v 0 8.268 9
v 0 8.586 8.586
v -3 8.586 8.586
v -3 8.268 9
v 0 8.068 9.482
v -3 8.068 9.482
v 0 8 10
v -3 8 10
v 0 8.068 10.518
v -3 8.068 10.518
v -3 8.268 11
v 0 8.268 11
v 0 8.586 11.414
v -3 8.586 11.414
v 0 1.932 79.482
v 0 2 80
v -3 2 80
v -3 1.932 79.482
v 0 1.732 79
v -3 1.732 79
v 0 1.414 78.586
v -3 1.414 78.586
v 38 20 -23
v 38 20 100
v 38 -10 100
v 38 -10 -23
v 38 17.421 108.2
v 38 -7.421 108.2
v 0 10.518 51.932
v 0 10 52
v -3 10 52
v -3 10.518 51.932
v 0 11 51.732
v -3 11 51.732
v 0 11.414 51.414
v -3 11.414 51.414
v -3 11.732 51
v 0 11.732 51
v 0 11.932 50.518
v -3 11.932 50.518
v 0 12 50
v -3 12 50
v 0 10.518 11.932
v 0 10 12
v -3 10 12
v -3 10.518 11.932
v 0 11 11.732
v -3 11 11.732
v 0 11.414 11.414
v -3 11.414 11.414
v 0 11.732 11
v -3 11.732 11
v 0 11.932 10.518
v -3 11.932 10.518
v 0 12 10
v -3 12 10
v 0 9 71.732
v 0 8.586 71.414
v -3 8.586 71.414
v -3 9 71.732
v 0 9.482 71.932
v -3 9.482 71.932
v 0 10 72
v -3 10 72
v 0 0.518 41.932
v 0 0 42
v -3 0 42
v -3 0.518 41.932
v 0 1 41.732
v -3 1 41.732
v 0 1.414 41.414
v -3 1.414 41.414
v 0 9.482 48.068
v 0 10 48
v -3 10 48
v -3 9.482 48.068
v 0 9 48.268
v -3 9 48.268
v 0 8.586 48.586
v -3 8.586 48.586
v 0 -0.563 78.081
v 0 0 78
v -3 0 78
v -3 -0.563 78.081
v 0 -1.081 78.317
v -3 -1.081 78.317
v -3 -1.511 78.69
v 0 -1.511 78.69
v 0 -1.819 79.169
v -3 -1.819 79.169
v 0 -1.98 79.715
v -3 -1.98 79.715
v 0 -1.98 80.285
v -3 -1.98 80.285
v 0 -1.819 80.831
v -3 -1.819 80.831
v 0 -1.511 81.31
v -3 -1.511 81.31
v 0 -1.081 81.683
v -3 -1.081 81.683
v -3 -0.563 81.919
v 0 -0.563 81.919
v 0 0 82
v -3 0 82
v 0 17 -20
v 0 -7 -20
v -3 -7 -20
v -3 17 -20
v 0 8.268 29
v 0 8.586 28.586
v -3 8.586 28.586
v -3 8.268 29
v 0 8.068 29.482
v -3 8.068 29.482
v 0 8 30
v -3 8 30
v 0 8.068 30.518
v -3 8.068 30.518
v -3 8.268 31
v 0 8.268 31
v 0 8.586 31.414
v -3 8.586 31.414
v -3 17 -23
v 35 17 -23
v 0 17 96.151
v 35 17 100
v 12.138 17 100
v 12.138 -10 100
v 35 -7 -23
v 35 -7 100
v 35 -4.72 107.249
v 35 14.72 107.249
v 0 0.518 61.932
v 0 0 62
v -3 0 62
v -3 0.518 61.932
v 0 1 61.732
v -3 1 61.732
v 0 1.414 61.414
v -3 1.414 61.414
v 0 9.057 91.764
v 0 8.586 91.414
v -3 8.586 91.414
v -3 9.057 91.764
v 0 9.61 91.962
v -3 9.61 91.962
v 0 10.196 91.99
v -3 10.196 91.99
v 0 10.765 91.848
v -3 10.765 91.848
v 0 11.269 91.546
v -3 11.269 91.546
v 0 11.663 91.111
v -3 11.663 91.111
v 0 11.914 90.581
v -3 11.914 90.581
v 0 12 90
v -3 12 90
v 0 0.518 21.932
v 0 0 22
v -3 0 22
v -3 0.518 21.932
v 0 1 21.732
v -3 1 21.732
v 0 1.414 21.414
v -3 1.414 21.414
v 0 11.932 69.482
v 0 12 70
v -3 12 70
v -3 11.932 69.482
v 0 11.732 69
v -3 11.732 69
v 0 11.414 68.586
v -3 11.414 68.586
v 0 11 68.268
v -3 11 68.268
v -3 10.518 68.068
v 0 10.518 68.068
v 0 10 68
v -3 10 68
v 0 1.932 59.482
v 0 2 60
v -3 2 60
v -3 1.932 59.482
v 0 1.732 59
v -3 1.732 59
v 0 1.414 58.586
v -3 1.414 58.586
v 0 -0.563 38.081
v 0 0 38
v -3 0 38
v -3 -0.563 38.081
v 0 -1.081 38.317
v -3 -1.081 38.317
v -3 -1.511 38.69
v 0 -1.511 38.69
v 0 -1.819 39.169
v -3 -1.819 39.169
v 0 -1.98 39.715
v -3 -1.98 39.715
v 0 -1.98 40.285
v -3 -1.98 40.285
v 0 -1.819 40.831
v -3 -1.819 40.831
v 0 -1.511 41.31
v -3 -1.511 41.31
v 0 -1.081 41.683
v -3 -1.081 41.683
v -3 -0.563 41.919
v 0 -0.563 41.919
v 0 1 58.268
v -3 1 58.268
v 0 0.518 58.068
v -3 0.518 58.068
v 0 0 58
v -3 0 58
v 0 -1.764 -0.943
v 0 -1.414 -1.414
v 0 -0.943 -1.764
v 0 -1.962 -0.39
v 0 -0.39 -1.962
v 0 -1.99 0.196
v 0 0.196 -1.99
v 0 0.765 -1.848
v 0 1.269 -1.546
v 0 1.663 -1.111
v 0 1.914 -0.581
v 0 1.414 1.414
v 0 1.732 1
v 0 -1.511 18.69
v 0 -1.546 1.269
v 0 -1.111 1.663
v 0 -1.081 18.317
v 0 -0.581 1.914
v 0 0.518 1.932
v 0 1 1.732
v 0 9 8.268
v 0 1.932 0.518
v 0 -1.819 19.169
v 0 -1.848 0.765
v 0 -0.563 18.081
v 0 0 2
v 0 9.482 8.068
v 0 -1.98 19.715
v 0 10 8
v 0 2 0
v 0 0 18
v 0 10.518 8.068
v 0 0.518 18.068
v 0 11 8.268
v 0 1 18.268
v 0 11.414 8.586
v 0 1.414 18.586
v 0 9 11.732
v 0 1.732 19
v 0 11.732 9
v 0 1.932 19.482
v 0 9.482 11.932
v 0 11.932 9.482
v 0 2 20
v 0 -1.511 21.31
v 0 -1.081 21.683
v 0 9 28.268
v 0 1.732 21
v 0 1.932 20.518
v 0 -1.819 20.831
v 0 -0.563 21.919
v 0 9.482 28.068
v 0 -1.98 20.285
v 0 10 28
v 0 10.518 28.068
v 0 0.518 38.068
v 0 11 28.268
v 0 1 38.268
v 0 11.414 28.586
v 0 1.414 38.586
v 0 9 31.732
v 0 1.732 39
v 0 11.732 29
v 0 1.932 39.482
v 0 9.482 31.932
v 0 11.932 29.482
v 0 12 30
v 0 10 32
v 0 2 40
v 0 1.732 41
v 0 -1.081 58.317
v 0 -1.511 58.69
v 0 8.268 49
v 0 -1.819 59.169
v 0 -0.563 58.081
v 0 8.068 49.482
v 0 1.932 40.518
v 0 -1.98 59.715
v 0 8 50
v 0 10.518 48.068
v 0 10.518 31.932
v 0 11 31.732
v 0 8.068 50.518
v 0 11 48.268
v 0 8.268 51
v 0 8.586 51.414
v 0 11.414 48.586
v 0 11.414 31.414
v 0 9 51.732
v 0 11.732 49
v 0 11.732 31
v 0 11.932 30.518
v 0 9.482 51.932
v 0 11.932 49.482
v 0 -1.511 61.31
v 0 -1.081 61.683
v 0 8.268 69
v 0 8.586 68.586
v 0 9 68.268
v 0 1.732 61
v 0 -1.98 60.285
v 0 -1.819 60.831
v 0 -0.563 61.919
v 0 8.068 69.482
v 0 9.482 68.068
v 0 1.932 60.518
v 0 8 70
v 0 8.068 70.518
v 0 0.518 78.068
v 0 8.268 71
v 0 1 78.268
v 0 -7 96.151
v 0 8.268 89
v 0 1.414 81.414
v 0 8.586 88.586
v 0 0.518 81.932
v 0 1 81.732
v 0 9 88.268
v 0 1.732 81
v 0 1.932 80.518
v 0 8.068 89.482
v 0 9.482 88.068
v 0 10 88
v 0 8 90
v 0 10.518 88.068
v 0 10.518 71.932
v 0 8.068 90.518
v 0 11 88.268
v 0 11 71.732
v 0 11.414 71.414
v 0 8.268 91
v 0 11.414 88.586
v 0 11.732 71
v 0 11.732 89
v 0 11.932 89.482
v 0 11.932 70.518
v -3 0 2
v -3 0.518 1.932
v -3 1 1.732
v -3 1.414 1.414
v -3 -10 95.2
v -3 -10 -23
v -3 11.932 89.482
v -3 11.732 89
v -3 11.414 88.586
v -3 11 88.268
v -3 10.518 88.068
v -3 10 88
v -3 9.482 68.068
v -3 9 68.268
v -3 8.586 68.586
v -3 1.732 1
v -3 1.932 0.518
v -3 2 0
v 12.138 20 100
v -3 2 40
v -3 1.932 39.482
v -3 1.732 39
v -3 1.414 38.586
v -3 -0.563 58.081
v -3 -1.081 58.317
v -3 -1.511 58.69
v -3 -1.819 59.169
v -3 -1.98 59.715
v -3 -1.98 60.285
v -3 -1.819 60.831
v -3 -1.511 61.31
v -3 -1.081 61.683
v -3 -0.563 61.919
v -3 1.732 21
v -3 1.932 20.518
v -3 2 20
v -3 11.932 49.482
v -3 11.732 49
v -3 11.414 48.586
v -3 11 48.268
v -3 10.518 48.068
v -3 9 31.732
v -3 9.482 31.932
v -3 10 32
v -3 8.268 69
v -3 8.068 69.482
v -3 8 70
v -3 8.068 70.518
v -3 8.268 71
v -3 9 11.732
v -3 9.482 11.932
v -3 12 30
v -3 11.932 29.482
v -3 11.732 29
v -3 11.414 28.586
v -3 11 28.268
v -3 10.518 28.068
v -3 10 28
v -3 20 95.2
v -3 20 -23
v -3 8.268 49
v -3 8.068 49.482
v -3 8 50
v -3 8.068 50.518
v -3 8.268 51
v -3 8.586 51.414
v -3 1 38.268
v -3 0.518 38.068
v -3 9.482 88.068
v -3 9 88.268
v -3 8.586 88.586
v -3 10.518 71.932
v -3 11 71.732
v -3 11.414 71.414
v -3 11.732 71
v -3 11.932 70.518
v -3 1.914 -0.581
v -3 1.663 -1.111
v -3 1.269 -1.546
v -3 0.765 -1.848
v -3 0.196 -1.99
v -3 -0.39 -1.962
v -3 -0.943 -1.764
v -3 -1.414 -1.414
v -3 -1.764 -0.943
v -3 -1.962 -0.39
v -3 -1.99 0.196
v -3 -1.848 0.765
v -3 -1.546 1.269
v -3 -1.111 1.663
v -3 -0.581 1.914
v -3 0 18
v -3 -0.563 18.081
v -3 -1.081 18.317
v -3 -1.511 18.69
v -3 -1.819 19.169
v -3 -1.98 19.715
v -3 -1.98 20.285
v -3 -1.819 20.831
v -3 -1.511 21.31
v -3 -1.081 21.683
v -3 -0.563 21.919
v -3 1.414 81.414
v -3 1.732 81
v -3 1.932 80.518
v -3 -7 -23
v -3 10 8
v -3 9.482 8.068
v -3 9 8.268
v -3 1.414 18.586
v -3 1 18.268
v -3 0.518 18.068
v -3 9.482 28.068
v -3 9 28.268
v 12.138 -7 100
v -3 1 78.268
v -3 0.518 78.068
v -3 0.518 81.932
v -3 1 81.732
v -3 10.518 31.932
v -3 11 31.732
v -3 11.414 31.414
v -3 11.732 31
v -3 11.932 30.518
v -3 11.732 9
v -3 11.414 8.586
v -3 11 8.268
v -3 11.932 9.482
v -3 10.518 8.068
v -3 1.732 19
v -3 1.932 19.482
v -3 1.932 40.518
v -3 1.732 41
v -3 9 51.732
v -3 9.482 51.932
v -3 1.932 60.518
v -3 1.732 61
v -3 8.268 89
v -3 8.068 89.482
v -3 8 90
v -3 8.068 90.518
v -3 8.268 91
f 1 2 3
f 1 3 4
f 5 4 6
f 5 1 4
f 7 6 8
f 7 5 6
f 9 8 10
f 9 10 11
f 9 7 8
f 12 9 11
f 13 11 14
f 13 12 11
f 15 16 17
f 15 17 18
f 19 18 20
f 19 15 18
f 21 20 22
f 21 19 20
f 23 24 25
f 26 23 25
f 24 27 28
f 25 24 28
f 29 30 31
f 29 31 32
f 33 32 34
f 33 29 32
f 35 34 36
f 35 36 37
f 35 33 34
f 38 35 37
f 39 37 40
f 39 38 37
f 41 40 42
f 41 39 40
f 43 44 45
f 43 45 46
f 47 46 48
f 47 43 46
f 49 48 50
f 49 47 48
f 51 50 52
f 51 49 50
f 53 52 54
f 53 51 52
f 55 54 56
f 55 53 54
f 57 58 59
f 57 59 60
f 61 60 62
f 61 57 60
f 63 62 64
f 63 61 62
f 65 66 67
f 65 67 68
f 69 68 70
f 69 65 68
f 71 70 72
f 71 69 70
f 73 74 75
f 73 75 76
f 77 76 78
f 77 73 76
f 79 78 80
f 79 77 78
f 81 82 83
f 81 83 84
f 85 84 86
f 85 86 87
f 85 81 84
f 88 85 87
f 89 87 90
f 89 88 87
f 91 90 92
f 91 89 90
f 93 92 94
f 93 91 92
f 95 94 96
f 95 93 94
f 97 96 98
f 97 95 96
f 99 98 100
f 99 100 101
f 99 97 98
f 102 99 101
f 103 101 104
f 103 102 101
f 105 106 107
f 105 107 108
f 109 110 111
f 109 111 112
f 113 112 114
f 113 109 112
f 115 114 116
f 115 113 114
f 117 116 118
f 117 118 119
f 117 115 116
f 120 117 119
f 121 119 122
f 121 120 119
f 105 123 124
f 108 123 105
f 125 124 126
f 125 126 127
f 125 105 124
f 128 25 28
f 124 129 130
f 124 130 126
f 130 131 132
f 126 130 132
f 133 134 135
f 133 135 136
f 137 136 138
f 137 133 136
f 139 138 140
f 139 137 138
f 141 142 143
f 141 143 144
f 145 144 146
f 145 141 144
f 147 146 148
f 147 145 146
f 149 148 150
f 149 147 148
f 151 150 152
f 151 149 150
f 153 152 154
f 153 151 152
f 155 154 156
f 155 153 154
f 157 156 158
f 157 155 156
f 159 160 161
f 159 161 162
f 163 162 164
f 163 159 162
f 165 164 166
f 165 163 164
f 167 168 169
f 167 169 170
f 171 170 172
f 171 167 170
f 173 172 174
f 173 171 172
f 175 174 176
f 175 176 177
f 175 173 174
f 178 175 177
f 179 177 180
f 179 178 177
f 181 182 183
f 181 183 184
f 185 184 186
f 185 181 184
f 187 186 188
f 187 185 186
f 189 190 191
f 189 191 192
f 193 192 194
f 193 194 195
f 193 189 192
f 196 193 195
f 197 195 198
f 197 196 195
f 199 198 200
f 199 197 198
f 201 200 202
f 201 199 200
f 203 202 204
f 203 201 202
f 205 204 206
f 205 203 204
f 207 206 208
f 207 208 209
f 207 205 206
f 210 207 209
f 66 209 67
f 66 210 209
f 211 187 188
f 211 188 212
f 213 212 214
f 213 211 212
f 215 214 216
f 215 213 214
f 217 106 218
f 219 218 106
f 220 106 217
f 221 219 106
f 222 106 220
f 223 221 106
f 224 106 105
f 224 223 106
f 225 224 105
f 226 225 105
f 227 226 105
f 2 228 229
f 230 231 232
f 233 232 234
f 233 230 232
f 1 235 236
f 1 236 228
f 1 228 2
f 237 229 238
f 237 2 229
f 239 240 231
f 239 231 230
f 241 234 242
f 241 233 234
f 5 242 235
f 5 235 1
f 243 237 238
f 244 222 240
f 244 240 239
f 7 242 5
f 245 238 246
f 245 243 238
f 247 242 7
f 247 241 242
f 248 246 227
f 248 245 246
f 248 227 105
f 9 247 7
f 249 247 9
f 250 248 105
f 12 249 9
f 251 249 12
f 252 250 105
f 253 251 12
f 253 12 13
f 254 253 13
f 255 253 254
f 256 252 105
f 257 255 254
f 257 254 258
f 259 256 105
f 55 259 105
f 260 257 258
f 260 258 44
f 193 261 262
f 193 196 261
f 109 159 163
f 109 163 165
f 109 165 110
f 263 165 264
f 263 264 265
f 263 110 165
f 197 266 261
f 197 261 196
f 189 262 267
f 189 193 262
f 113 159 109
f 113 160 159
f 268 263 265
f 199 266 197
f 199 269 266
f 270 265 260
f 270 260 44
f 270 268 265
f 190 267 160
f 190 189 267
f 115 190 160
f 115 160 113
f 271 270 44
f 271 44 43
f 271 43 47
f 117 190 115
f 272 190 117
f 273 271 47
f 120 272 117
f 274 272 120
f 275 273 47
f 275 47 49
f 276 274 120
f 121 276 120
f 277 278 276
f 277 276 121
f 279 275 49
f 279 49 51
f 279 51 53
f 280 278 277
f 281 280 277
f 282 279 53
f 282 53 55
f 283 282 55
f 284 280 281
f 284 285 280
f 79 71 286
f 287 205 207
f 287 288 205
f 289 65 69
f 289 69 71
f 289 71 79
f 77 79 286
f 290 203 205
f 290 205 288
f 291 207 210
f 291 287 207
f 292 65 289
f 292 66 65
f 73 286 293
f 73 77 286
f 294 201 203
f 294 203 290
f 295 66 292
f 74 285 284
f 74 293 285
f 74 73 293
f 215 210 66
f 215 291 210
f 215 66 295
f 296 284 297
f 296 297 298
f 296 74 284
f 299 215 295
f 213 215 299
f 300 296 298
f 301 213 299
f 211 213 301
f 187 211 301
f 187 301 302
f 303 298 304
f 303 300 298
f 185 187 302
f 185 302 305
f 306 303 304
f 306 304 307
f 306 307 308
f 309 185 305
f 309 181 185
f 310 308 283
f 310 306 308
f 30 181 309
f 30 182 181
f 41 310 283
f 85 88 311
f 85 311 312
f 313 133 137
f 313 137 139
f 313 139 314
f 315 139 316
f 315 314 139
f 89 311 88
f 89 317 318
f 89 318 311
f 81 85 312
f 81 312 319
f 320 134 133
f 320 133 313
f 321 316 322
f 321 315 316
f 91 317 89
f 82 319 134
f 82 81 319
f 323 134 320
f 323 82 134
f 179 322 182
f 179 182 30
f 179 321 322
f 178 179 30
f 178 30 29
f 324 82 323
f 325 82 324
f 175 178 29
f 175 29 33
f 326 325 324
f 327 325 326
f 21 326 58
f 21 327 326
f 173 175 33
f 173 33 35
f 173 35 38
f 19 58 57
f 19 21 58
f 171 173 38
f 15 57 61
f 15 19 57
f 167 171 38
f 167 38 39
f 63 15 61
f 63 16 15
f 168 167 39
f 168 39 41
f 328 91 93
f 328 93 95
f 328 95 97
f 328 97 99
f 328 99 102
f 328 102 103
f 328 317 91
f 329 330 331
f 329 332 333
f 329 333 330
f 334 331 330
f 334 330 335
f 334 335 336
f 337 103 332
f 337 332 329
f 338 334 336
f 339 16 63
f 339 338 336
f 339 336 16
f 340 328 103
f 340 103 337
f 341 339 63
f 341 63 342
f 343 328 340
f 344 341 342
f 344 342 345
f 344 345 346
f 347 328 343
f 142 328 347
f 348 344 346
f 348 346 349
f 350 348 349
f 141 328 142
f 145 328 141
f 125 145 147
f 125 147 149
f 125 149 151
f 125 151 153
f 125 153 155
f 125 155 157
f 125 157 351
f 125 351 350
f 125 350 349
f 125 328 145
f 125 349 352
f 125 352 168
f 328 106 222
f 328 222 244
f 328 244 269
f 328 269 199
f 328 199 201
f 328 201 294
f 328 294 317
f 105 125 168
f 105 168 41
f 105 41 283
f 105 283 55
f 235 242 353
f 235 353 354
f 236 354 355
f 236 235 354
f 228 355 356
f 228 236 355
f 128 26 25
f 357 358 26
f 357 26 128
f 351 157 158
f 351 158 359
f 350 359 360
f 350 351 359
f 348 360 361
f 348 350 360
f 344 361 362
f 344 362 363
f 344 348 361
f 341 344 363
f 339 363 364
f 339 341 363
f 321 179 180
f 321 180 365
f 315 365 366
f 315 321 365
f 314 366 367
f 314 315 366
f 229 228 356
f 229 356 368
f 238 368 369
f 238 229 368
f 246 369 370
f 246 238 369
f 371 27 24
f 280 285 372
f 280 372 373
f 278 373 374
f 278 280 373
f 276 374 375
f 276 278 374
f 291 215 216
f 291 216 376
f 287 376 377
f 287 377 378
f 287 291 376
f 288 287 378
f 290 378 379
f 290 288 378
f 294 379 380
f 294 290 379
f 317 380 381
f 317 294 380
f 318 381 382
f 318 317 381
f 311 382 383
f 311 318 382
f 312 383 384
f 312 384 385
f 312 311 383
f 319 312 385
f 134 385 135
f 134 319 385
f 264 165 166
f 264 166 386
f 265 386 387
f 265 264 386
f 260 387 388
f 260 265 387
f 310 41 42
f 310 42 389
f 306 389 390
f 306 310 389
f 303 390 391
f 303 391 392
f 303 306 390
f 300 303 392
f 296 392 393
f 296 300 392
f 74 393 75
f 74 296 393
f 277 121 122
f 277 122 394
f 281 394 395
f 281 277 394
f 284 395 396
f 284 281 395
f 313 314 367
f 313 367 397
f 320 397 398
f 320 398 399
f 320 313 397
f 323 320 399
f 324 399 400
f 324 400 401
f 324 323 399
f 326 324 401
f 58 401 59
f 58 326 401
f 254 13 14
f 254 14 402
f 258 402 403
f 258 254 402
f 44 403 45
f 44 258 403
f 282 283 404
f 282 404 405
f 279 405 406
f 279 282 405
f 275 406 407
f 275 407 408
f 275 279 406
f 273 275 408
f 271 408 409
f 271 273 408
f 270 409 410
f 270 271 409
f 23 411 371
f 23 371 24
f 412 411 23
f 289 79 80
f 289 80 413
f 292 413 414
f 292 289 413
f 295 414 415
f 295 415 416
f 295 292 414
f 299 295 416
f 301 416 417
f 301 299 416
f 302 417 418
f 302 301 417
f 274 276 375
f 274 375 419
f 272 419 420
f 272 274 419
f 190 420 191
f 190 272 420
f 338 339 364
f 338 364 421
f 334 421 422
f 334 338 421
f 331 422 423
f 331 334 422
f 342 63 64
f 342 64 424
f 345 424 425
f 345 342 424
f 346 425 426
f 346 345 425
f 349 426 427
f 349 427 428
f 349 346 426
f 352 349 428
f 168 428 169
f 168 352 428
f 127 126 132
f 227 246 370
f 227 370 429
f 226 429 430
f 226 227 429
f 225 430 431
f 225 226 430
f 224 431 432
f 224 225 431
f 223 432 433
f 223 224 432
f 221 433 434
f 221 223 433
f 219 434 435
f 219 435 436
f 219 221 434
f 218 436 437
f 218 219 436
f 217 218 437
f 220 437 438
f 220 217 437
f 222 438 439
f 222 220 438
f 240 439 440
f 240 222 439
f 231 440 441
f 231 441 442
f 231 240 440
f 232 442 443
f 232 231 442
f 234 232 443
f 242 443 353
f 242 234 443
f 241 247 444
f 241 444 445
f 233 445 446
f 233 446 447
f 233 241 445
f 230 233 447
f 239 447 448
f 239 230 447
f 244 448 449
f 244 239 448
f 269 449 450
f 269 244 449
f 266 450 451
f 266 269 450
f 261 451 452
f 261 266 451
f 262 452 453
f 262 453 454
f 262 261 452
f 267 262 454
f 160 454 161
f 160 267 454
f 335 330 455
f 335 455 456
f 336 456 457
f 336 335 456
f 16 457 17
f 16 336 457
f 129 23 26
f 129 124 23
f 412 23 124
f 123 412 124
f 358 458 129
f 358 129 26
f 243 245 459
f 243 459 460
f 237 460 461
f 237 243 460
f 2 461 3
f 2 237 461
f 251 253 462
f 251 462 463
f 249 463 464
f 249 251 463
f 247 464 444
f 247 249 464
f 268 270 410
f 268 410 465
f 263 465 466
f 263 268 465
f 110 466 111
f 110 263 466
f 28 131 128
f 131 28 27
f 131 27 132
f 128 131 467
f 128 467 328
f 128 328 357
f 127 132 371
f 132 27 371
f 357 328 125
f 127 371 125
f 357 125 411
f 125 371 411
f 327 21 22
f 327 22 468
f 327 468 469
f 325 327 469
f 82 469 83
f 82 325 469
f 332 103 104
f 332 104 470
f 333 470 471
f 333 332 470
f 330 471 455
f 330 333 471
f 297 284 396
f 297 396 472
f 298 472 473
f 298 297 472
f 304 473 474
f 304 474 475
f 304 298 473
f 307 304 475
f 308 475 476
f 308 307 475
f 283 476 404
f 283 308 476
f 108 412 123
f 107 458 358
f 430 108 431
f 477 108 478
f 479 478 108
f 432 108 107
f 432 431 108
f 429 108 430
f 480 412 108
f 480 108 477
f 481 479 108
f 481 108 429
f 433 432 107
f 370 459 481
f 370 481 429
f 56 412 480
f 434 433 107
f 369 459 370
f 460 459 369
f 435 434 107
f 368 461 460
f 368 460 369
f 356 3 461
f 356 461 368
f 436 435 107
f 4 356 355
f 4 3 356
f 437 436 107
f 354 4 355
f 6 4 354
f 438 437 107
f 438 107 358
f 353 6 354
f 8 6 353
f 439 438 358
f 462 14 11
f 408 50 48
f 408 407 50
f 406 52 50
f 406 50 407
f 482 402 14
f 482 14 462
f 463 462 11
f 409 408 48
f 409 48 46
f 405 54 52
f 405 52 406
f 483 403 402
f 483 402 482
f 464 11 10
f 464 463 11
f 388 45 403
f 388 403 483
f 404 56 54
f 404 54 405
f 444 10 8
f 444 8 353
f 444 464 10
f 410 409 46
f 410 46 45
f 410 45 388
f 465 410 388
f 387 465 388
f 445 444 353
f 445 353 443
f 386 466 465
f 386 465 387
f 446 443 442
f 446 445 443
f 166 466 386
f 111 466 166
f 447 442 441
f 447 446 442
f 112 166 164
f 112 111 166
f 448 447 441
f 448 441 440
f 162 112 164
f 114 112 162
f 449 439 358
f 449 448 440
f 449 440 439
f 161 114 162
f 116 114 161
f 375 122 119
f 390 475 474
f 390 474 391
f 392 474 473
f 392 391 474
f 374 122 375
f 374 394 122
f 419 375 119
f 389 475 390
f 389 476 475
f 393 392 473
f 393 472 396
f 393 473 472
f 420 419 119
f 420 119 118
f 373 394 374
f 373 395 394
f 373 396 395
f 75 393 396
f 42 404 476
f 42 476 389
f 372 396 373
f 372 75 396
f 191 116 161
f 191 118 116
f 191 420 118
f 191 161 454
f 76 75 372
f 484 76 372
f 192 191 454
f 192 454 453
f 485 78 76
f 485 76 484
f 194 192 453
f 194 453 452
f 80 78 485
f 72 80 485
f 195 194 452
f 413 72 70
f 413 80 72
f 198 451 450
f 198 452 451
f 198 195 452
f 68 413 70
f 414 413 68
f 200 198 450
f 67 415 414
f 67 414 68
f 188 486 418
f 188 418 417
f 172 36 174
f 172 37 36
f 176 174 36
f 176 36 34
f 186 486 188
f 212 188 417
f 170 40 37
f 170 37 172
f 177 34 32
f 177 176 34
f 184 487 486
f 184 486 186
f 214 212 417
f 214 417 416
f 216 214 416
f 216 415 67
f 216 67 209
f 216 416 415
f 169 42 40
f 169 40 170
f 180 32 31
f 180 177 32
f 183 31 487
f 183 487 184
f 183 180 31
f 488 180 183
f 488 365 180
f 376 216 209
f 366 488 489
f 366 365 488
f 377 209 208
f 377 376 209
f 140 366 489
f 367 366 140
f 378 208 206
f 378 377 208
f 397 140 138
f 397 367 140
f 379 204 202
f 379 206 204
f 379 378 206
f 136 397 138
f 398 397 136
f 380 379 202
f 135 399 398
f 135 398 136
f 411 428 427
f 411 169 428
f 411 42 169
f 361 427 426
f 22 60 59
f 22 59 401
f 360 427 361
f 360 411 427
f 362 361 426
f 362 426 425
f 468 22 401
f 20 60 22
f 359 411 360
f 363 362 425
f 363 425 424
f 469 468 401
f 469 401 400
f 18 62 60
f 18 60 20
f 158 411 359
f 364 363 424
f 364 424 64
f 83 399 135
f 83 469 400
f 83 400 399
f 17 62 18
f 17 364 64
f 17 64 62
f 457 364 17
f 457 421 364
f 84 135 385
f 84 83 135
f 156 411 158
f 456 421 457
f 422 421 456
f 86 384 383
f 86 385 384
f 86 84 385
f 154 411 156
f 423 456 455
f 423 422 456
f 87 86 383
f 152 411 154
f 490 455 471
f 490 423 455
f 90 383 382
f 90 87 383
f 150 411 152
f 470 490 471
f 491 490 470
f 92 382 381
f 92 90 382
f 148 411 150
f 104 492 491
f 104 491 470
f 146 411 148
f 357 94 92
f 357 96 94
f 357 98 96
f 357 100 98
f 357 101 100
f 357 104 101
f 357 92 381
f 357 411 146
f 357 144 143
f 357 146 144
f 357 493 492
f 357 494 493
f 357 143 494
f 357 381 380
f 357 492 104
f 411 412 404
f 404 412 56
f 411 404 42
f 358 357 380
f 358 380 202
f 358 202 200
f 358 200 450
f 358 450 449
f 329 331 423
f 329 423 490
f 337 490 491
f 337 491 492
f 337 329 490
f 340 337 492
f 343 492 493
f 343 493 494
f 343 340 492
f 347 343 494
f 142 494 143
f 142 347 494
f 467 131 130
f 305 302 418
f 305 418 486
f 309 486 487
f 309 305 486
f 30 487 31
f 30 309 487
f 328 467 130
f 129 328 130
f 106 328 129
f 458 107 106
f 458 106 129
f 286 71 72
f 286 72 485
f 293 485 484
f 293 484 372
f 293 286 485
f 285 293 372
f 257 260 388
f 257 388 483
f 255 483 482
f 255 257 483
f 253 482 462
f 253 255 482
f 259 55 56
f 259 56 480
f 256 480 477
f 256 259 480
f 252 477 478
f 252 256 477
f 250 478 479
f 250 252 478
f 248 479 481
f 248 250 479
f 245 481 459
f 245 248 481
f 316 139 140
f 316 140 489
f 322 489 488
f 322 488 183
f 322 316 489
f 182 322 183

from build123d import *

# Parameters (mm, degrees)
F1_DEPTH = 3
F2_W     = 3
F2_H     = 3
F2_H_2   = 120
F3_DEPTH = 41
F5_DEPTH = 3
F7_DEPTH = 39.6


with BuildPart() as f1:
    # F0 (on Right) → F1 (new body)
    with BuildSketch(Plane.YZ):
        Polygon((-7, -20), (5, -20), (17, -20), (17, 100), (14, 109.5393920142), (-4, 109.5393920142), (-7, 100), align=None)
        with BuildLine():
            Line((10, 28), (10, 12))
            ThreePointArc((10, 12), (11.4142135624, 11.4142135624), (12, 10))
            ThreePointArc((12, 10), (11.4142135624, 8.5857864376), (10, 8))
            Line((10, 8), (10, 0))
            Line((10, 0), (5, 0))
            Line((5, 0), (2, 0))
            ThreePointArc((2, 0), (-1.4142135624, -1.4142135624), (0, 2))
            Line((0, 2), (0, 18))
            ThreePointArc((0, 18), (-2, 20), (0, 22))
            Line((0, 22), (0, 38))
            ThreePointArc((0, 38), (-2, 40), (0, 42))
            Line((0, 42), (0, 58))
            ThreePointArc((0, 58), (-2, 60), (0, 62))
            Line((0, 62), (0, 78))
            ThreePointArc((0, 78), (-2, 80), (0, 82))
            Line((0, 82), (0, 98))
            ThreePointArc((0, 98), (-1.4142135624, 101.4142135624), (2, 100))
            ThreePointArc((2, 100), (1.847759065, 99.2346331353), (1.4142135624, 98.5857864376))
            Line((1.4142135624, 98.5857864376), (8.5857864376, 91.4142135624))
            ThreePointArc((8.5857864376, 91.4142135624), (10.7653668647, 91.847759065), (12, 90))
            ThreePointArc((12, 90), (11.4142135624, 88.5857864376), (10, 88))
            Line((10, 88), (10, 72))
            ThreePointArc((10, 72), (11.4142135624, 71.4142135624), (12, 70))
            ThreePointArc((12, 70), (11.4142135624, 68.5857864376), (10, 68))
            Line((10, 68), (10, 52))
            ThreePointArc((10, 52), (11.4142135624, 51.4142135624), (12, 50))
            ThreePointArc((12, 50), (11.4142135624, 48.5857864376), (10, 48))
            Line((10, 48), (10, 32))
            ThreePointArc((10, 32), (11.4142135624, 31.4142135624), (12, 30))
            ThreePointArc((12, 30), (11.4142135624, 28.5857864376), (10, 28))
        make_face(mode=Mode.SUBTRACT)
        with BuildLine():
            ThreePointArc((8.5857864376, 8.5857864376), (8, 10), (8.5857864376, 11.4142135624))
            Line((8.5857864376, 11.4142135624), (1.4142135624, 18.5857864376))
            ThreePointArc((1.4142135624, 18.5857864376), (0.7653668647, 18.152240935), (0, 18))
            Line((0, 18), (0, 2))
            ThreePointArc((0, 2), (0.7653668647, 1.847759065), (1.4142135624, 1.4142135624))
            Line((1.4142135624, 1.4142135624), (8.5857864376, 8.5857864376))
        make_face()
        with BuildLine():
            ThreePointArc((10, 8), (9.2346331353, 8.152240935), (8.5857864376, 8.5857864376))
            Line((8.5857864376, 8.5857864376), (1.4142135624, 1.4142135624))
            ThreePointArc((1.4142135624, 1.4142135624), (1.847759065, 0.7653668647), (2, 0))
            Line((2, 0), (5, 0))
            Line((5, 0), (10, 0))
            Line((10, 0), (10, 8))
        make_face()
        with BuildLine():
            Line((1.4142135624, 18.5857864376), (8.5857864376, 11.4142135624))
            ThreePointArc((8.5857864376, 11.4142135624), (9.2346331353, 11.847759065), (10, 12))
            Line((10, 12), (10, 28))
            ThreePointArc((10, 28), (9.2346331353, 28.152240935), (8.5857864376, 28.5857864376))
            Line((8.5857864376, 28.5857864376), (1.4142135624, 21.4142135624))
            ThreePointArc((1.4142135624, 21.4142135624), (1.847759065, 20.7653668647), (2, 20))
            ThreePointArc((2, 20), (1.847759065, 19.2346331353), (1.4142135624, 18.5857864376))
        make_face()
        with BuildLine():
            Line((1.4142135624, 21.4142135624), (8.5857864376, 28.5857864376))
            ThreePointArc((8.5857864376, 28.5857864376), (8, 30), (8.5857864376, 31.4142135624))
            Line((8.5857864376, 31.4142135624), (1.4142135624, 38.5857864376))
            ThreePointArc((1.4142135624, 38.5857864376), (0.7653668647, 38.152240935), (0, 38))
            Line((0, 38), (0, 22))
            ThreePointArc((0, 22), (0.7653668647, 21.847759065), (1.4142135624, 21.4142135624))
        make_face()
        with BuildLine():
            Line((1.4142135624, 38.5857864376), (8.5857864376, 31.4142135624))
            ThreePointArc((8.5857864376, 31.4142135624), (9.2346331353, 31.847759065), (10, 32))
            Line((10, 32), (10, 48))
            ThreePointArc((10, 48), (9.2346331353, 48.152240935), (8.5857864376, 48.5857864376))
            Line((8.5857864376, 48.5857864376), (1.4142135624, 41.4142135624))
            ThreePointArc((1.4142135624, 41.4142135624), (1.847759065, 40.7653668647), (2, 40))
            ThreePointArc((2, 40), (1.847759065, 39.2346331353), (1.4142135624, 38.5857864376))
        make_face()
        with BuildLine():
            Line((0, 58), (0, 42))
            ThreePointArc((0, 42), (0.7653668647, 41.847759065), (1.4142135624, 41.4142135624))
            Line((1.4142135624, 41.4142135624), (8.5857864376, 48.5857864376))
            ThreePointArc((8.5857864376, 48.5857864376), (8, 50), (8.5857864376, 51.4142135624))
            Line((8.5857864376, 51.4142135624), (1.4142135624, 58.5857864376))
            ThreePointArc((1.4142135624, 58.5857864376), (0.7653668647, 58.152240935), (0, 58))
        make_face()
        with BuildLine():
            Line((1.4142135624, 58.5857864376), (8.5857864376, 51.4142135624))
            ThreePointArc((8.5857864376, 51.4142135624), (9.2346331353, 51.847759065), (10, 52))
            Line((10, 52), (10, 68))
            ThreePointArc((10, 68), (9.2346331353, 68.152240935), (8.5857864376, 68.5857864376))
            Line((8.5857864376, 68.5857864376), (1.4142135624, 61.4142135624))
            ThreePointArc((1.4142135624, 61.4142135624), (1.847759065, 60.7653668647), (2, 60))
            ThreePointArc((2, 60), (1.847759065, 59.2346331353), (1.4142135624, 58.5857864376))
        make_face()
        with BuildLine():
            Line((0, 78), (0, 62))
            ThreePointArc((0, 62), (0.7653668647, 61.847759065), (1.4142135624, 61.4142135624))
            Line((1.4142135624, 61.4142135624), (8.5857864376, 68.5857864376))
            ThreePointArc((8.5857864376, 68.5857864376), (8, 70), (8.5857864376, 71.4142135624))
            Line((8.5857864376, 71.4142135624), (1.4142135624, 78.5857864376))
            ThreePointArc((1.4142135624, 78.5857864376), (0.7653668647, 78.152240935), (0, 78))
        make_face()
        with BuildLine():
            ThreePointArc((2, 80), (1.847759065, 79.2346331353), (1.4142135624, 78.5857864376))
            Line((1.4142135624, 78.5857864376), (8.5857864376, 71.4142135624))
            ThreePointArc((8.5857864376, 71.4142135624), (9.2346331353, 71.847759065), (10, 72))
            Line((10, 72), (10, 88))
            ThreePointArc((10, 88), (9.2346331353, 88.152240935), (8.5857864376, 88.5857864376))
            Line((8.5857864376, 88.5857864376), (1.4142135624, 81.4142135624))
            ThreePointArc((1.4142135624, 81.4142135624), (1.847759065, 80.7653668647), (2, 80))
        make_face()
        with BuildLine():
            Line((0, 98), (0, 82))
            ThreePointArc((0, 82), (0.7653668647, 81.847759065), (1.4142135624, 81.4142135624))
            Line((1.4142135624, 81.4142135624), (8.5857864376, 88.5857864376))
            ThreePointArc((8.5857864376, 88.5857864376), (8, 90), (8.5857864376, 91.4142135624))
            Line((8.5857864376, 91.4142135624), (1.4142135624, 98.5857864376))
            ThreePointArc((1.4142135624, 98.5857864376), (0.7653668647, 98.152240935), (0, 98))
        make_face()
    extrude(amount=-F1_DEPTH)

    # F2 (on face) → F3 (join)
    with BuildSketch(Plane(origin=(-3, 0, 0), x_dir=(0, -1, 0), z_dir=(-1, 0, 0))):
        with Locations((-18.5, -21.5)):
            Rectangle(F2_W, F2_H)
        with Locations((-18.5, 40)):
            Rectangle(F2_W, F2_H_2)
        Polygon((7, 109.5393920142), (4, 109.5393920142), (7, 100), (7, -20), (7, -23), (10, -23), (10, 100), align=None)
        Polygon((-17, 100), (-14, 109.5393920142), (-17, 109.5393920142), (-20, 100), align=None)
    extrude(amount=-F3_DEPTH)

    # F4 (on face) → F5 (join)
    with BuildSketch(Plane.YZ.offset(38)):
        Polygon((17, 109.5393920142), (-7, 109.5393920142), (-10, 100), (-10, -23), (20, -23), (20, 100), align=None)
    extrude(amount=-F5_DEPTH)

    # F6 (on face) → F7 (cut)
    with BuildSketch(Plane(origin=(0, 20, 0), x_dir=(-1, 0, 0), z_dir=(0, 1, 0))):
        Polygon((3, 95.2), (3, 100), (3, 110), (-38, 110), (-38, 108.2), align=None)
    extrude(amount=-F7_DEPTH, mode=Mode.SUBTRACT)


solid = f1.part
